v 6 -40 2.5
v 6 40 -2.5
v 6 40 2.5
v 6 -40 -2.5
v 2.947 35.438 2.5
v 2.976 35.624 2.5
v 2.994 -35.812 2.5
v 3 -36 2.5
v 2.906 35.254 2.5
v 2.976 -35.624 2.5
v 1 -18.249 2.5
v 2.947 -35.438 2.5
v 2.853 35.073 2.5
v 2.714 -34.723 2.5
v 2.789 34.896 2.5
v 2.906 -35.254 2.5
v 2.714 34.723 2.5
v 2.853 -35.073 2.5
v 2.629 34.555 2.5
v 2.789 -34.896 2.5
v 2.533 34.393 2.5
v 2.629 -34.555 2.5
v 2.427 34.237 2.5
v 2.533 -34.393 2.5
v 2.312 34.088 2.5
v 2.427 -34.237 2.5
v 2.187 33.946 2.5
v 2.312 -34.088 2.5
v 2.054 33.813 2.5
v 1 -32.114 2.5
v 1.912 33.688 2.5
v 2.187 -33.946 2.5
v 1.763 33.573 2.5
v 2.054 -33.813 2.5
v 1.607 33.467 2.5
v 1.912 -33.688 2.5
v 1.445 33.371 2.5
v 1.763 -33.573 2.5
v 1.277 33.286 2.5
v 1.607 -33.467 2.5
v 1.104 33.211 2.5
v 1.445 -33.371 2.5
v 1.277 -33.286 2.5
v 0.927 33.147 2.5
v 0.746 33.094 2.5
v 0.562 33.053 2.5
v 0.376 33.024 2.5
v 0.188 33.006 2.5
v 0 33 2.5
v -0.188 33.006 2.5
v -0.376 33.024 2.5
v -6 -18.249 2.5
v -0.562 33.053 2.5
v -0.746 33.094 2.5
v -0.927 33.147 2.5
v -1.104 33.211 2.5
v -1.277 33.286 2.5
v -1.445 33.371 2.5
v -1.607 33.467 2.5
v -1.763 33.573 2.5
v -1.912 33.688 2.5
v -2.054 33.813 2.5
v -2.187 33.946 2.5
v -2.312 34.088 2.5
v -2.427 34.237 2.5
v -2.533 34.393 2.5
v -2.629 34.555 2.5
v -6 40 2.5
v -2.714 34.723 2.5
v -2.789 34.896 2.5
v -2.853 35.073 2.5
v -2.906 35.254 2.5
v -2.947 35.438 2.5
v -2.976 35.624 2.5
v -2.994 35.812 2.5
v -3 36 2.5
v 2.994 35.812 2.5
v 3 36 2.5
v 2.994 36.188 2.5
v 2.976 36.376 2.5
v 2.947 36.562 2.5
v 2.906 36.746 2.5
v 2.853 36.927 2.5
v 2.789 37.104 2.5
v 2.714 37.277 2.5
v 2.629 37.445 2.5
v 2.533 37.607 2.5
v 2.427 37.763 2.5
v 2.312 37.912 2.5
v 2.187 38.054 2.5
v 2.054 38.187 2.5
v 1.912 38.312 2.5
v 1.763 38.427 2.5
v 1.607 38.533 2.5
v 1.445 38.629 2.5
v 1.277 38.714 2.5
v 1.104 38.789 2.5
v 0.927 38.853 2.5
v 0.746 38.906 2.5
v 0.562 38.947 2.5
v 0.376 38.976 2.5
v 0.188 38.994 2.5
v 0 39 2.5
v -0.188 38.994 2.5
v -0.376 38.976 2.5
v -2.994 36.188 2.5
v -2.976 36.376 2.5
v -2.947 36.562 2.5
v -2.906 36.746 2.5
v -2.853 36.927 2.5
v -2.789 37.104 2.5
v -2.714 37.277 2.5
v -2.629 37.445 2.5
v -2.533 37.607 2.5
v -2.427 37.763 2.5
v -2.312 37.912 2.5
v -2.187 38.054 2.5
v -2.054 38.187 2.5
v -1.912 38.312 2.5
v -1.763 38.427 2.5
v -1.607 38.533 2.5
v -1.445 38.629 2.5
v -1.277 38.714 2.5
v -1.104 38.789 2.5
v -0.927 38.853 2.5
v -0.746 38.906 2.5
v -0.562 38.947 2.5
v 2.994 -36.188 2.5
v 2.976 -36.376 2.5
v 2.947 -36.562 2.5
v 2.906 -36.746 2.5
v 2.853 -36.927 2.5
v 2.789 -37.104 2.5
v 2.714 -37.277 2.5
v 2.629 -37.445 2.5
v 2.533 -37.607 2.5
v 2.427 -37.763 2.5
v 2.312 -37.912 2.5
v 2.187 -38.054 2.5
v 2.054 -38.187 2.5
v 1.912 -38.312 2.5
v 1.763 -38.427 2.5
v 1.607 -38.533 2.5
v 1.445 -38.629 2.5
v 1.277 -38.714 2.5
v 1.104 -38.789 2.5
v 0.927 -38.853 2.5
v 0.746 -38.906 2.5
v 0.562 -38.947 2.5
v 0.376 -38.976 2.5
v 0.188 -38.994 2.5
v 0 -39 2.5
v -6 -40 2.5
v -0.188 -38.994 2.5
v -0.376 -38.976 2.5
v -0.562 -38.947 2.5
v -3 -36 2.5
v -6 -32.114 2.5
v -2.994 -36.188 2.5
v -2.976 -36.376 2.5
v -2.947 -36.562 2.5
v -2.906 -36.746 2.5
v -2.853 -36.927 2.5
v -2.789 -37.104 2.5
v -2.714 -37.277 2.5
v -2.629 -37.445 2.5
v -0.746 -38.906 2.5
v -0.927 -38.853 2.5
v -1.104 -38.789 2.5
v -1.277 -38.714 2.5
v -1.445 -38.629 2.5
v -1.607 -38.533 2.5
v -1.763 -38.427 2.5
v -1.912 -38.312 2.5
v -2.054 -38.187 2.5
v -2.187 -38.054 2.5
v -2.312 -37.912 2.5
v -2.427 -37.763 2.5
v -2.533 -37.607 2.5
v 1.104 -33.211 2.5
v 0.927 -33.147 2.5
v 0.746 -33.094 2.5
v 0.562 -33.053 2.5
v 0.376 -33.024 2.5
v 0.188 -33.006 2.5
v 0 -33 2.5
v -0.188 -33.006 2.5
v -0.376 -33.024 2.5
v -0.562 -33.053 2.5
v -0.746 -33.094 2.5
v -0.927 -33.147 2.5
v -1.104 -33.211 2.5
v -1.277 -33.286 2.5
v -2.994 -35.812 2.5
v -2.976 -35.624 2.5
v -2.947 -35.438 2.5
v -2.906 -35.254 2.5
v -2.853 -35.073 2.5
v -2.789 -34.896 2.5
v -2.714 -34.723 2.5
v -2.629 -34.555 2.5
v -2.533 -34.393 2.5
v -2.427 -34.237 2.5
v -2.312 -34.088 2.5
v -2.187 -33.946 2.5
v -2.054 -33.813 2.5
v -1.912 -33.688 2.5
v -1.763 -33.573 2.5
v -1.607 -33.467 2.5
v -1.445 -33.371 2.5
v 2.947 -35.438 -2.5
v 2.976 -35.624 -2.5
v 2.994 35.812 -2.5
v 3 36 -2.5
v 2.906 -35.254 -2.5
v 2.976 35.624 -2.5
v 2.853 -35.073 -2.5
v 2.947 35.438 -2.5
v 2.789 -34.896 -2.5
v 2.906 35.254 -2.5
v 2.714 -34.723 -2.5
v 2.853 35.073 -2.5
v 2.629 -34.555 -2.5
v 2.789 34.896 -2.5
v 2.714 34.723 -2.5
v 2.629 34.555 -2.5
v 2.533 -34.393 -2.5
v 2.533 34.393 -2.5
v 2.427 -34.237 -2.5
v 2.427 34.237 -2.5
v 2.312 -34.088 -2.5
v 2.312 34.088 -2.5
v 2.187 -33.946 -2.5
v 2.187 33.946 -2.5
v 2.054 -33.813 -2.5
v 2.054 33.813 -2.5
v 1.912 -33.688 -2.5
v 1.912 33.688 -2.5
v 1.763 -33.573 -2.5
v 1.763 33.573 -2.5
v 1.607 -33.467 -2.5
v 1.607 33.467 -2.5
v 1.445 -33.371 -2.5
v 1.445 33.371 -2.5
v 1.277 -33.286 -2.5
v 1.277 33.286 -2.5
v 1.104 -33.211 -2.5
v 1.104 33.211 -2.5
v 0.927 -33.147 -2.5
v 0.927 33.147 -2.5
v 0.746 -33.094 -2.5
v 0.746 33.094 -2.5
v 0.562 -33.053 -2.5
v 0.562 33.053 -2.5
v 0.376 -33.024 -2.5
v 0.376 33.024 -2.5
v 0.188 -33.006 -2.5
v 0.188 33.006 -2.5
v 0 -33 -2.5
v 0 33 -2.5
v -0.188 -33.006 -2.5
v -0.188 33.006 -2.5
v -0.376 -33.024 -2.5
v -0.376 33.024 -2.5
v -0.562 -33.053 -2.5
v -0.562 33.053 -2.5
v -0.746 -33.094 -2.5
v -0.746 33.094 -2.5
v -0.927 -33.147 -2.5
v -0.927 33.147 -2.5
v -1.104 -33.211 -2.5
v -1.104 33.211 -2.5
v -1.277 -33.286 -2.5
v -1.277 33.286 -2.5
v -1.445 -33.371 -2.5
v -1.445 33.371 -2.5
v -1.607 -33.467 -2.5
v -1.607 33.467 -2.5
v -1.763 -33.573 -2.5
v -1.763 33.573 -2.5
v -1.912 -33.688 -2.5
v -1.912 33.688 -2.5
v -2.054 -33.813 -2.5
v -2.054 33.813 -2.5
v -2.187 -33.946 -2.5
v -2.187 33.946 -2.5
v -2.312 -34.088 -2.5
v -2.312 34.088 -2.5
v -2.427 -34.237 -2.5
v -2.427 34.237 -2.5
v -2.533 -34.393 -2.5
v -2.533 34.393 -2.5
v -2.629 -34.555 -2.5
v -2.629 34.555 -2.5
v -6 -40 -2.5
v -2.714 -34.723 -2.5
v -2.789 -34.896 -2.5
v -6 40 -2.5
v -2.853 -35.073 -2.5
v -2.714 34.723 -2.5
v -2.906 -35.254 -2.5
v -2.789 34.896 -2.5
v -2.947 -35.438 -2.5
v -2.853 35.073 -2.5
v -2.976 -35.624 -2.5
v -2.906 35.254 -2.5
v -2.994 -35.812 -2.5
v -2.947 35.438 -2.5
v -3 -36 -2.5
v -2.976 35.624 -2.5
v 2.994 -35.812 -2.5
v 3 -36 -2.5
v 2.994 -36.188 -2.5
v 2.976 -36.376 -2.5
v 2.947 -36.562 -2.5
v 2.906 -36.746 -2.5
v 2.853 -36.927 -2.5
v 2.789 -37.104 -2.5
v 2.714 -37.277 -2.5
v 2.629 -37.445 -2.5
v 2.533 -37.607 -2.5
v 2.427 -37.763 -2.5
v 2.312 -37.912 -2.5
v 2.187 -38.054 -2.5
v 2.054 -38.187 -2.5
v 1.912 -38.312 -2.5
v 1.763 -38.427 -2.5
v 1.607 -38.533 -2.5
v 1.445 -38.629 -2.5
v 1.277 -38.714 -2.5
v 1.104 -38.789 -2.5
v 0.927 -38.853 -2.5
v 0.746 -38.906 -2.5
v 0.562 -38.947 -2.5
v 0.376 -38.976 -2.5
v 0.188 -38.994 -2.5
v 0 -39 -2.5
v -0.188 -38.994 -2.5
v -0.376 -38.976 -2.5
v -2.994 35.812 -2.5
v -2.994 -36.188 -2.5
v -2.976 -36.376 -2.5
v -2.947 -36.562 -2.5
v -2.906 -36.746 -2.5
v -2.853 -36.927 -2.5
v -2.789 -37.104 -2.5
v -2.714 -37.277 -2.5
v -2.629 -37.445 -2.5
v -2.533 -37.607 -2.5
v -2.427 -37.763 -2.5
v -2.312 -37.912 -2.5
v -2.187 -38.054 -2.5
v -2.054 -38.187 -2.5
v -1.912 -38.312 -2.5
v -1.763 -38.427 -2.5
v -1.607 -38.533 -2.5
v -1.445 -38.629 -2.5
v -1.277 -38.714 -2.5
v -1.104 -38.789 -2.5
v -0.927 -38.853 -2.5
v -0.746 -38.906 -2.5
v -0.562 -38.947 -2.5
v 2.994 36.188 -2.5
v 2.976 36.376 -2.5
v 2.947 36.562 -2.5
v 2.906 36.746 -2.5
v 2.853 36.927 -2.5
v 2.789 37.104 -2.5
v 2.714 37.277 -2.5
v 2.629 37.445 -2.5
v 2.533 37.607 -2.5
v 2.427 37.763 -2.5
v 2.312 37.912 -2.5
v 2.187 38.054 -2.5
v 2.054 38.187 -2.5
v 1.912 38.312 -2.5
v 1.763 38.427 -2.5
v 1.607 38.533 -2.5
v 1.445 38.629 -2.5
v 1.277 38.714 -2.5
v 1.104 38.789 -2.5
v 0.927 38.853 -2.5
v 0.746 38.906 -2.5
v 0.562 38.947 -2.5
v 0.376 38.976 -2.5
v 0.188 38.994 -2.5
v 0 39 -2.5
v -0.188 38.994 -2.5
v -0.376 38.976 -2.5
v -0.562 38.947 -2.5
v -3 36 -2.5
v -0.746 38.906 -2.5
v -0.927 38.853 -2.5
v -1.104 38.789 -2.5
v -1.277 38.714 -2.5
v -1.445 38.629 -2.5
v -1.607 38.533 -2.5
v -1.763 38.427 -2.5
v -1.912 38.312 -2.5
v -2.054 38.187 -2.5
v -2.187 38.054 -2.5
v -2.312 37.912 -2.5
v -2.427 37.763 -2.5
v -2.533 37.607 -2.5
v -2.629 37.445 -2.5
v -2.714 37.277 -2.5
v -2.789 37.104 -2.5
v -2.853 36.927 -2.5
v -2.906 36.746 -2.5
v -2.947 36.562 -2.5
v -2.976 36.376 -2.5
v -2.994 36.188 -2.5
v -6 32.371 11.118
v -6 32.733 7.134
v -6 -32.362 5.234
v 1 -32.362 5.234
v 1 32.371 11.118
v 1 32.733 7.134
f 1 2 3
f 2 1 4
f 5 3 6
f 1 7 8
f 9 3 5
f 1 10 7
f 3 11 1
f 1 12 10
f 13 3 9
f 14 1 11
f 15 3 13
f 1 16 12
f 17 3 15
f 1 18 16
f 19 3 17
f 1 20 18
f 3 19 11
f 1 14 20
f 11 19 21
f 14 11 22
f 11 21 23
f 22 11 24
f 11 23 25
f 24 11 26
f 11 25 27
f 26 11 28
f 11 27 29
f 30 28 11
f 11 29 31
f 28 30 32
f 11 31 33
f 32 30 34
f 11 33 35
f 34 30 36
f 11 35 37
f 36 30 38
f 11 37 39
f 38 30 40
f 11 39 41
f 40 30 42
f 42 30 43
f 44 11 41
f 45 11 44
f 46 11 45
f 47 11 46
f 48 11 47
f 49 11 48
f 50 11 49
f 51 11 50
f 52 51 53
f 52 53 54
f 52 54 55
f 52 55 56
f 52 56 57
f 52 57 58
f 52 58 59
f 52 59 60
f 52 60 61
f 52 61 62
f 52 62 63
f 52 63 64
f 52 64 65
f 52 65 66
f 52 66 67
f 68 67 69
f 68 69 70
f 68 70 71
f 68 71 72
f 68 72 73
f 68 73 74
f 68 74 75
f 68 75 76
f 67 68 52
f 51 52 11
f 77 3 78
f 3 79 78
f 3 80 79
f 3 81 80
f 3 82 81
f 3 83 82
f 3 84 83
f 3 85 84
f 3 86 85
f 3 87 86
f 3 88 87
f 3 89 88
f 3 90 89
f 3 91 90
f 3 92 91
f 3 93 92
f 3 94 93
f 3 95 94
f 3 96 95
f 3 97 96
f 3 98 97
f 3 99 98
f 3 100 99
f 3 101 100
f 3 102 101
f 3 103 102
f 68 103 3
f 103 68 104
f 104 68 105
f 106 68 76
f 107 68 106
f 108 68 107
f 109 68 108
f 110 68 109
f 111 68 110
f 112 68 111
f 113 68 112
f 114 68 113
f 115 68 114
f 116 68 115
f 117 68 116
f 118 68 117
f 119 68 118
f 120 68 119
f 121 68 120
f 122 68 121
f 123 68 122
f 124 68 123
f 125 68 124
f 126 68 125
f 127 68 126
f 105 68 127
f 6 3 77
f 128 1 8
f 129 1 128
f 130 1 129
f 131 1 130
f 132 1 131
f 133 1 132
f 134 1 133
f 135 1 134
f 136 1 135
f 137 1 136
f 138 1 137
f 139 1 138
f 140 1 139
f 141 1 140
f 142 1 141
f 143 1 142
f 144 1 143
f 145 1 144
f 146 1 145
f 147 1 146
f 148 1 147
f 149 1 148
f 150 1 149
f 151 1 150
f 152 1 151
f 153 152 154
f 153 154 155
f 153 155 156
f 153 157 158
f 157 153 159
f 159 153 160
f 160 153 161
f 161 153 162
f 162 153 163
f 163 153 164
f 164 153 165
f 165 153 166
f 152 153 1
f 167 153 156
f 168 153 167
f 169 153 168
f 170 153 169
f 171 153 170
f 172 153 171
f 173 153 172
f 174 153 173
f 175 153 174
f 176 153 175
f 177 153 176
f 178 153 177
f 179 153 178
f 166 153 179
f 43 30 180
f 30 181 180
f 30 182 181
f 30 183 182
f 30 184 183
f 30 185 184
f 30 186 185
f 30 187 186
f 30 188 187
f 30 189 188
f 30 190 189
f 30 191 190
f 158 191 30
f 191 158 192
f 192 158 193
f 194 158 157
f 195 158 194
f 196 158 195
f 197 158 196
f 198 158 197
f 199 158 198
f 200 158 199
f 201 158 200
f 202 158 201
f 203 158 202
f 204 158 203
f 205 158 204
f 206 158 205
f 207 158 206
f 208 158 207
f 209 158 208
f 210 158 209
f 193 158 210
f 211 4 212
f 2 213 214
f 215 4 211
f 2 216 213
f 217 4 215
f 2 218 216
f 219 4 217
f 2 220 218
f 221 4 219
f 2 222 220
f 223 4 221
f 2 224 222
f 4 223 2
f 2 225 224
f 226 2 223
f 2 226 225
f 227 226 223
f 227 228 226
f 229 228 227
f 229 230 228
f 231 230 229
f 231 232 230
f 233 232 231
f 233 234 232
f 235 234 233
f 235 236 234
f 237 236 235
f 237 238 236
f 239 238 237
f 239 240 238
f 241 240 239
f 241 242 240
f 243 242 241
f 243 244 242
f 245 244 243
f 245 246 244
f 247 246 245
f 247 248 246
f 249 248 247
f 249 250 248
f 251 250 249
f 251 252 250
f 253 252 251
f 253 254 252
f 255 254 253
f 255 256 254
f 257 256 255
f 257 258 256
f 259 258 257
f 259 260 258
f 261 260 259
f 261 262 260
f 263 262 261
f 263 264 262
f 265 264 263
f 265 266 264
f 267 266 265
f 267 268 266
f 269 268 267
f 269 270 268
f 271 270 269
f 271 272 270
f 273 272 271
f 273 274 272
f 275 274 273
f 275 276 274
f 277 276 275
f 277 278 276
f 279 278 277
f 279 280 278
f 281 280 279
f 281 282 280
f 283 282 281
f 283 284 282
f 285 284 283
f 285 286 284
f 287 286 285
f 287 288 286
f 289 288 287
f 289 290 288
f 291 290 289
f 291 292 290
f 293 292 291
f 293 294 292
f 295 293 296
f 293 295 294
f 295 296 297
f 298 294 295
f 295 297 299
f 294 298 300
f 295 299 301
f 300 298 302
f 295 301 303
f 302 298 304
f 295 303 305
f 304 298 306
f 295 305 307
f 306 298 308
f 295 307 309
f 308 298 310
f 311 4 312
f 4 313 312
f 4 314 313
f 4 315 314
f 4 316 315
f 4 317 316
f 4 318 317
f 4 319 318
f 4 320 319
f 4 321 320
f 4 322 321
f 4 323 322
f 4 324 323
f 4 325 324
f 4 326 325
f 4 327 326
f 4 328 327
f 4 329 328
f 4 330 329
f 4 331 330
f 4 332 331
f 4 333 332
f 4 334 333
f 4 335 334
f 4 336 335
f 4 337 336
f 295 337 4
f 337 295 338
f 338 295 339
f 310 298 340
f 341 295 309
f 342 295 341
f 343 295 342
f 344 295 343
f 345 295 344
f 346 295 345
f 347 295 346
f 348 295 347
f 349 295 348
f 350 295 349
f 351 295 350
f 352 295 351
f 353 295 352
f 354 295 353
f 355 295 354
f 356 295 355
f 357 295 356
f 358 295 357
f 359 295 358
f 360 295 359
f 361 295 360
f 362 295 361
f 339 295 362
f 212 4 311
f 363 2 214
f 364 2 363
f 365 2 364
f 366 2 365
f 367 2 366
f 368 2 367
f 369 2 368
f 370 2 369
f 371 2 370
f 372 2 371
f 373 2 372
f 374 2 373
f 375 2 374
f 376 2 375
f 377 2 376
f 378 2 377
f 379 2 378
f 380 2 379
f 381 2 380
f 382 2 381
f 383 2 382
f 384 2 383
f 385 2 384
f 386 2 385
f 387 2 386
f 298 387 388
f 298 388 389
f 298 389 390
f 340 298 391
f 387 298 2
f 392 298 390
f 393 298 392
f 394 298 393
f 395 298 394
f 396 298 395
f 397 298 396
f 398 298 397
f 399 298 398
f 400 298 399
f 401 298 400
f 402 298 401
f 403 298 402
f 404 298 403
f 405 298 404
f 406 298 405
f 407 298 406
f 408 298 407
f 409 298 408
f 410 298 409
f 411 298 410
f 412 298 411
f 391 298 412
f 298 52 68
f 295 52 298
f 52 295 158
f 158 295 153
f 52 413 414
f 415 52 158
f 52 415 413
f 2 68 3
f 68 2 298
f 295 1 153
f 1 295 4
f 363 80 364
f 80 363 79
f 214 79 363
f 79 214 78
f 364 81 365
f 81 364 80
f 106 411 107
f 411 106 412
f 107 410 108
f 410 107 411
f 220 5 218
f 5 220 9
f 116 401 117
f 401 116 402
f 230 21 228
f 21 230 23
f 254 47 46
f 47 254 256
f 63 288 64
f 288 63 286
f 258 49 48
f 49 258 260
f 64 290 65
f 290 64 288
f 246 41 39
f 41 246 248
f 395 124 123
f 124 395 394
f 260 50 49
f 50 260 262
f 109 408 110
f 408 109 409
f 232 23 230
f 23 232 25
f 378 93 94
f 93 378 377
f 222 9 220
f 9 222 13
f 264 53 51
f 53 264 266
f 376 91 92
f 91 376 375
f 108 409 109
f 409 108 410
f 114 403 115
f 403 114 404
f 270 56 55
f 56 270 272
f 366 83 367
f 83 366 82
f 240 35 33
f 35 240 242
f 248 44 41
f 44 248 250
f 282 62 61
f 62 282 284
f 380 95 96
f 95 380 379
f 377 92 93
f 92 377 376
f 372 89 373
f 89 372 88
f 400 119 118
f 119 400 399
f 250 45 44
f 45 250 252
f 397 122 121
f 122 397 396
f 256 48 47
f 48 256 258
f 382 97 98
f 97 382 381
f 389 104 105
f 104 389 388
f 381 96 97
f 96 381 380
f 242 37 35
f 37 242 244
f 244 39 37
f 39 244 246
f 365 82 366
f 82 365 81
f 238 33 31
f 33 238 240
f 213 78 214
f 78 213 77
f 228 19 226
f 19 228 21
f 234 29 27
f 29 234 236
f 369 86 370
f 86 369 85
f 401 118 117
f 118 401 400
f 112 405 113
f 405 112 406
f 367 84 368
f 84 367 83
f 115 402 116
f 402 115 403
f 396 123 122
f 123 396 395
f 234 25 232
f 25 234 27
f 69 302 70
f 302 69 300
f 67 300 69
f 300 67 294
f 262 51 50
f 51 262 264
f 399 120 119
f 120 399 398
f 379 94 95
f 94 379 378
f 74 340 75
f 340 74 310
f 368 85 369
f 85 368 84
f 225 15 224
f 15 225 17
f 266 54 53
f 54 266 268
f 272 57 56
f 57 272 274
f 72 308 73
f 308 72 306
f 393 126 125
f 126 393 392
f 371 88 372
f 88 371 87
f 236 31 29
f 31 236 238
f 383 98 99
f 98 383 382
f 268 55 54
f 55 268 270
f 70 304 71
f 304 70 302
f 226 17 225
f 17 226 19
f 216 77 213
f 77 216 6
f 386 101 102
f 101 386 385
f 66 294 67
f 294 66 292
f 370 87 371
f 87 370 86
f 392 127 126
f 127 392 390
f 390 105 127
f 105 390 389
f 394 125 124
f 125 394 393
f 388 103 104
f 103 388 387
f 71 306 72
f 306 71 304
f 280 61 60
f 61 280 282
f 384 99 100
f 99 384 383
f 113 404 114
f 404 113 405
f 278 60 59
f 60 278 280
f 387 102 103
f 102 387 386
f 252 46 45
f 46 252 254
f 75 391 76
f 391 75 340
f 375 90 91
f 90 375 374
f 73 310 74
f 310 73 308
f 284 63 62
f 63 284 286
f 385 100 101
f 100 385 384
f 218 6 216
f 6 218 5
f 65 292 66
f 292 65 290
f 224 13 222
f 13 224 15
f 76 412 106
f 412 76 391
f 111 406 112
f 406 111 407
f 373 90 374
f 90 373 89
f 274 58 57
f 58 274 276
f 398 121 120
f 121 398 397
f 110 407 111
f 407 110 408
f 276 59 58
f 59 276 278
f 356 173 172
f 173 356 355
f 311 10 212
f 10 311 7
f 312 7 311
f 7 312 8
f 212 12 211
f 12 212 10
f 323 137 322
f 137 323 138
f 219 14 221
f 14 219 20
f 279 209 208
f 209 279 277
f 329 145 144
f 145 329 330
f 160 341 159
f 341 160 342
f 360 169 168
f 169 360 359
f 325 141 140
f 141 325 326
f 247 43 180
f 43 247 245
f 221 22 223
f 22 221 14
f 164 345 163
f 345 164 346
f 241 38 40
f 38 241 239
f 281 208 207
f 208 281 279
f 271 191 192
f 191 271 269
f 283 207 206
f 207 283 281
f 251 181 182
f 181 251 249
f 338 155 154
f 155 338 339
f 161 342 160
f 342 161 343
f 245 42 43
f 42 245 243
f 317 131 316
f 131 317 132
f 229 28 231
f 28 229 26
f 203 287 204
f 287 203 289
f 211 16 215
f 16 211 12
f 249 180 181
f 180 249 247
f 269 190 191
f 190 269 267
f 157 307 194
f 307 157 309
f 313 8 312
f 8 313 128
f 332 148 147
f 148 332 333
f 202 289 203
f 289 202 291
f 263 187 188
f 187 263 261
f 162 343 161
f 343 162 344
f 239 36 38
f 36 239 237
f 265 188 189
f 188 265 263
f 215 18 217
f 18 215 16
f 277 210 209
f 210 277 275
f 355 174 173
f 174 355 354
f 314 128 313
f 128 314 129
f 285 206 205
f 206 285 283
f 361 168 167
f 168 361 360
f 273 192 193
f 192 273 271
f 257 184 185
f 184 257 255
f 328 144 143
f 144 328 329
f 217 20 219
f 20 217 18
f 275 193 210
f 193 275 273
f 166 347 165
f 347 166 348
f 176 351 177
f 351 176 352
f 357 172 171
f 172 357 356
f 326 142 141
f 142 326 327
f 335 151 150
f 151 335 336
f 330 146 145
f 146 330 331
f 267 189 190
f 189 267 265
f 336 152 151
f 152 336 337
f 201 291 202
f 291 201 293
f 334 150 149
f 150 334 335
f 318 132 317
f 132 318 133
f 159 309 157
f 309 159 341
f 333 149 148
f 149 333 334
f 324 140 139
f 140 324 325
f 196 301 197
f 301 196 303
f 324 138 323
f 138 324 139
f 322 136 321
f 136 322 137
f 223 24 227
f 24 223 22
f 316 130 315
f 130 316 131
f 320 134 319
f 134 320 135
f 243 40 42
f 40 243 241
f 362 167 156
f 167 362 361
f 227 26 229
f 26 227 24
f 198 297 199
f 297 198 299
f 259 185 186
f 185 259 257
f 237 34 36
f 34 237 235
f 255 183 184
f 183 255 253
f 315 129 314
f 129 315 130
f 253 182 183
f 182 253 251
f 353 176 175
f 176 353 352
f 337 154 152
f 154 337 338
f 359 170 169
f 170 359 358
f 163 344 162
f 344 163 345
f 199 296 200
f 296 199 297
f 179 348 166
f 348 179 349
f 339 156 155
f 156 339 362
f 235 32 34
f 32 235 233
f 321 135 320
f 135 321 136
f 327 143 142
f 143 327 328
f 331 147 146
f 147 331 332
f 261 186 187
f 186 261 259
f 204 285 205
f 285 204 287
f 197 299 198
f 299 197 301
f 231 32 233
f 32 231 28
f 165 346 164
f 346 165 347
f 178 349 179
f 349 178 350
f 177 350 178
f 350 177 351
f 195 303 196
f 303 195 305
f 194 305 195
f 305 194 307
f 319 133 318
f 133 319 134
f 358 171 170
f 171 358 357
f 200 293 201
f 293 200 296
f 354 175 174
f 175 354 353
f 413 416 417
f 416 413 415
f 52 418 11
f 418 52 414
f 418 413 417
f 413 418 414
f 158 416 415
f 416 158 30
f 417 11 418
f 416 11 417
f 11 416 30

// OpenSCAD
//Wire Clip. Created by Michael Warburton

//Define Variables
top_h=4;
top_l=65;
top_w=7;
bot_h=5;
bot_l=80;
bot_w=12;
hole_diam=6;
hole_r=hole_diam/2;
con_angle=5.194;
hole_h=15;

$fn=100;//resolution

//top
translate([-bot_w/2,-bot_l/2+8,bot_h/4])
rotate([con_angle,0,0])//Angle betw Top and Bot
cube([top_w,top_l,top_h]);

//screw holes
difference() {
cube([bot_w,bot_l,bot_h], center=true);
    
translate([0,bot_l/2-4,-bot_h])
cylinder(hole_h,hole_r,hole_r);
translate([0,-bot_l/2+4,-bot_h])
cylinder(hole_h,hole_r,hole_r);

}
